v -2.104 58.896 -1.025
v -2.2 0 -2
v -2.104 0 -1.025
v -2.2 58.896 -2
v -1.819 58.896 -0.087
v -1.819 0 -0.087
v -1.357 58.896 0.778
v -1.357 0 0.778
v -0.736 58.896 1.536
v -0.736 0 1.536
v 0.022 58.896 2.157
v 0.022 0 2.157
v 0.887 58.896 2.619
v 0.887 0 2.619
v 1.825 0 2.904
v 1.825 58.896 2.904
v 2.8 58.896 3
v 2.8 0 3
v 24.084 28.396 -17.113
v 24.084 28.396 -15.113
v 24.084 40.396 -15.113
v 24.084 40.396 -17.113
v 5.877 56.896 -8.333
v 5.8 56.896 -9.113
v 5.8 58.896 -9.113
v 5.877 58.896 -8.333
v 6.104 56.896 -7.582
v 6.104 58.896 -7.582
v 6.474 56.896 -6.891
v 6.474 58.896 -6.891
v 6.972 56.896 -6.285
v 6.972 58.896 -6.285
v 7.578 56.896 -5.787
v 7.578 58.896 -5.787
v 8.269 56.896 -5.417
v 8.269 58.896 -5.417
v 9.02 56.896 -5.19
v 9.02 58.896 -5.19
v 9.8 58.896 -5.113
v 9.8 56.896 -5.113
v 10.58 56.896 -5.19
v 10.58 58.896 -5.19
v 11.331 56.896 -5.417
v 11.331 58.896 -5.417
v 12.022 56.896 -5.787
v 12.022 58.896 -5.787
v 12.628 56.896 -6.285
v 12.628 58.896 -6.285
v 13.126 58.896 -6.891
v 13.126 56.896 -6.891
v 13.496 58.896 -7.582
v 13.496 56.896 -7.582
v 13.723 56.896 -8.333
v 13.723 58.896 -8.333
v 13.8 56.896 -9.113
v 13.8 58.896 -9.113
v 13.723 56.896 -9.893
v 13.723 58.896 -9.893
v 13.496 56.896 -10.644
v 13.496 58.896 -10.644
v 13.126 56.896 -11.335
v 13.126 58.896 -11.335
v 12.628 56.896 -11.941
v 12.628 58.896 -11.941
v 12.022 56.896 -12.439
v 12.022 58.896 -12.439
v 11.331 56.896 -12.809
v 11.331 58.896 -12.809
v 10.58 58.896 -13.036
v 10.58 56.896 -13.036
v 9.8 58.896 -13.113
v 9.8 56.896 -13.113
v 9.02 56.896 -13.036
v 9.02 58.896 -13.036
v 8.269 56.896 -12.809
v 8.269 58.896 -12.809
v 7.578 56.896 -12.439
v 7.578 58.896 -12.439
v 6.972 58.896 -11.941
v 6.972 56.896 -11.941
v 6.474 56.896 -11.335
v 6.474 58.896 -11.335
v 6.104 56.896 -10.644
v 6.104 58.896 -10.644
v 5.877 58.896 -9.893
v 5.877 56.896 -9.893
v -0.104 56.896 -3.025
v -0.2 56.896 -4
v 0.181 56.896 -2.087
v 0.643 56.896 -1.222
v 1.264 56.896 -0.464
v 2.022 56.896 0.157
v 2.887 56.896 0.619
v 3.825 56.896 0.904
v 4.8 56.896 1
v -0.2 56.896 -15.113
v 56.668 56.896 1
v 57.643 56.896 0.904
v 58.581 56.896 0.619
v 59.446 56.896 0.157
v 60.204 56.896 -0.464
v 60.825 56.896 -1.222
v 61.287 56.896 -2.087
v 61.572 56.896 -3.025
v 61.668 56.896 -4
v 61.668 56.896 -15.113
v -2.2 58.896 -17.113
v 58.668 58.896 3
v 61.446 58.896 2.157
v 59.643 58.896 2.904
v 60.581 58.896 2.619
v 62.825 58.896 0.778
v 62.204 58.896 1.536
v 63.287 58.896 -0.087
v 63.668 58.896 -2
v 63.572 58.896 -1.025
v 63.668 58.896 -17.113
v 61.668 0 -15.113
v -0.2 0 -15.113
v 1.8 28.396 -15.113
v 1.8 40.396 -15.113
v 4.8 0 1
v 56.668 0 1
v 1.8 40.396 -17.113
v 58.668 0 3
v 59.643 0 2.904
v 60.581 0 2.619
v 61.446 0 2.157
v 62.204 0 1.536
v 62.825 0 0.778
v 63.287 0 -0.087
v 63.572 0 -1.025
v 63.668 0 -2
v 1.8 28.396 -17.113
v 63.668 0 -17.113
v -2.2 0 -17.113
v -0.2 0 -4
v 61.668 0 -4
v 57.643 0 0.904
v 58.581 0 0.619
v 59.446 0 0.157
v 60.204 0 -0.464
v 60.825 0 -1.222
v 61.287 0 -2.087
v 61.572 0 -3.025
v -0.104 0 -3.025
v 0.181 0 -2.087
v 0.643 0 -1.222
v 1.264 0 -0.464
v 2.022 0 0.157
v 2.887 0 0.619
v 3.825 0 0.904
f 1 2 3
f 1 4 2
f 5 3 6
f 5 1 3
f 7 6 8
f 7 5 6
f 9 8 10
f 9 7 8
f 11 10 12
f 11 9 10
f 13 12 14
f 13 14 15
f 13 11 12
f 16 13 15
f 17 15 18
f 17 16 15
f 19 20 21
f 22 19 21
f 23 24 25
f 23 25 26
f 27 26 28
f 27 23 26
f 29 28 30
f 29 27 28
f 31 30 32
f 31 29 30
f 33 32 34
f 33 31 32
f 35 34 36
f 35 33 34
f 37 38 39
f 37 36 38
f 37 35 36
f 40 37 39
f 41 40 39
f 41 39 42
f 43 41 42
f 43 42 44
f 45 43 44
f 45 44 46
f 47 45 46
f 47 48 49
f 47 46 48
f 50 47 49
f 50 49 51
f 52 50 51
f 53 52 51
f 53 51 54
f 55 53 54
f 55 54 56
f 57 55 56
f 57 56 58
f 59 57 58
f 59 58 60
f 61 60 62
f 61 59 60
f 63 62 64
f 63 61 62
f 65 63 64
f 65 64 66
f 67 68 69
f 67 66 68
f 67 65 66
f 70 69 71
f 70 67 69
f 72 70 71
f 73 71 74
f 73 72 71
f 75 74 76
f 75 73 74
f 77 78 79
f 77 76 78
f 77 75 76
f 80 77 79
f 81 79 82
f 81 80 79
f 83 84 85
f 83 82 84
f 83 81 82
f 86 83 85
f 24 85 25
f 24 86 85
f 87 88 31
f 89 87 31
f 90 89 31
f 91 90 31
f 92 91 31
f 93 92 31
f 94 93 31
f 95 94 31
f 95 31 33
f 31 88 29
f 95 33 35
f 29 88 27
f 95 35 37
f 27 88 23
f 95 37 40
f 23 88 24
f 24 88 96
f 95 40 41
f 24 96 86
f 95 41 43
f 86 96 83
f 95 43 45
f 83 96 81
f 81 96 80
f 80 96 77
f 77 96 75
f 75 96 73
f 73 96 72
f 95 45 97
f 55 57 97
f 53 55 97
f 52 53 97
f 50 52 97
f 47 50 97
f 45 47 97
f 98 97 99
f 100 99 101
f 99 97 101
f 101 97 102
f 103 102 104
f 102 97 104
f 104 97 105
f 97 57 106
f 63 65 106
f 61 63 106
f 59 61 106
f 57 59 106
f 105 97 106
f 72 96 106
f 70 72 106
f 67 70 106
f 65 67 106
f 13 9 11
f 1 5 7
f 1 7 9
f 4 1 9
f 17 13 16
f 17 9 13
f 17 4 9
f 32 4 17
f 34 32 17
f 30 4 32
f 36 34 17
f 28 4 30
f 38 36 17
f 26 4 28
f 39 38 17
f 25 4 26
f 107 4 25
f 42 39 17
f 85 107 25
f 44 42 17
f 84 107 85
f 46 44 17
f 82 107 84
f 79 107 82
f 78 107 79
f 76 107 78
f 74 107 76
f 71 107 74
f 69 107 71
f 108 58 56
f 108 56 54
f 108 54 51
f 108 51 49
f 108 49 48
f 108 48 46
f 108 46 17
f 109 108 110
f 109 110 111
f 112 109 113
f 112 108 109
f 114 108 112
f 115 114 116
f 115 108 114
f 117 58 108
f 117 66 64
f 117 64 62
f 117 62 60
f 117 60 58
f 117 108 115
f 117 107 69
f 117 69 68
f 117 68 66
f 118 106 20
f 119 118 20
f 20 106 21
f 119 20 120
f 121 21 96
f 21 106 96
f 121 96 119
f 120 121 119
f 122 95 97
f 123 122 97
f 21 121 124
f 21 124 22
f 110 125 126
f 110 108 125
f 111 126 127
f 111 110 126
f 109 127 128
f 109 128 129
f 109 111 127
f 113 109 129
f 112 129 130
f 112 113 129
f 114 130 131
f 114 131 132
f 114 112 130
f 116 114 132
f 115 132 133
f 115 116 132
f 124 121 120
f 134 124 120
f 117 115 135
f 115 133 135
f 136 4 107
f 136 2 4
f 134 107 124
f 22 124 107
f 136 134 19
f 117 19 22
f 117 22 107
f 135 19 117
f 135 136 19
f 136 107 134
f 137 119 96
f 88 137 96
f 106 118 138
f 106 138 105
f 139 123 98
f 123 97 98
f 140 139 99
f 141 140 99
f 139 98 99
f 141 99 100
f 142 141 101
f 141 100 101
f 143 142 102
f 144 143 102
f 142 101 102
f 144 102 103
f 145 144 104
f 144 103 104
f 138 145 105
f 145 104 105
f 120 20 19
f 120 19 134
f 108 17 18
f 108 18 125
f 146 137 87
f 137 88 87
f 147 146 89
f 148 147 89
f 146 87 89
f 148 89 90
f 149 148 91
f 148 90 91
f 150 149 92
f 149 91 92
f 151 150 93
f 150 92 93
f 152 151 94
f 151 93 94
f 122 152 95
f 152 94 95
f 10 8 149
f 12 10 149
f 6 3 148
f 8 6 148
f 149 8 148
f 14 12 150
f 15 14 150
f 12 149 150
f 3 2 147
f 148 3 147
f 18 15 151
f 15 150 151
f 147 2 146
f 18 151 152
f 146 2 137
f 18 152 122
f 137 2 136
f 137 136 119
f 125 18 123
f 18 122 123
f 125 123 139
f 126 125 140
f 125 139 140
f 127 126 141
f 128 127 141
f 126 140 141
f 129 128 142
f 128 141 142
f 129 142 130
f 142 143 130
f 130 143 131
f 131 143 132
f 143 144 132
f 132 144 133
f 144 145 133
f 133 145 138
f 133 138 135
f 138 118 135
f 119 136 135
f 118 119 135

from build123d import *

# Parameters (mm, degrees)
SKETCH_1_W               = 65.868
SKETCH_1_H               = 56.896
EXTRUDE_1_DEPTH          = 2
CUT_EXTRUDE_1_DEPTH      = 86.409420089
CUT_EXTRUDE_1_DEPTH_BACK = 86.409420089
SKETCH_3_W               = 2
SKETCH_3_H               = 56.896
EXTRUDE_2_DEPTH          = 18.113
SKETCH_4_W               = 65.868
SKETCH_4_H               = 56.896
EXTRUDE_3_DEPTH          = 2
SKETCH_5_W               = 65.868
SKETCH_5_H               = 20.113
EXTRUDE_4_DEPTH          = 2
FILLET_1_R               = 5
CUT_EXTRUDE_2_DEPTH      = 89.403664002
CUT_EXTRUDE_2_DEPTH_BACK = 89.403664002
SKETCH_6_R               = 4


with BuildPart() as part:
    # Эскиз1 → Бобышка-Вытянуть1 (new body)
    with BuildSketch(Plane(origin=(0, 0, -15.113), x_dir=(-1, 0, 0), z_dir=(0, 0, -1))):
        with Locations((-30.734, 28.448)):
            Rectangle(SKETCH_1_W, SKETCH_1_H)
    extrude(amount=EXTRUDE_1_DEPTH)

    # Эскиз2 → Вырез-Вытянуть1 (cut, two sides: drawn at the far end of the back side and taken through both)
    with BuildSketch(Plane(origin=(0, 0, -17.113), x_dir=(-1, 0, 0), z_dir=(0, 0, -1)).offset(-CUT_EXTRUDE_1_DEPTH_BACK)):
        Polygon((-20.084, 40.396), (-1.8, 40.396), (-1.8, 28.396), (-20.084, 28.396), (-24.084, 28.396), (-24.084, 40.396), align=None)
    extrude(amount=CUT_EXTRUDE_1_DEPTH + CUT_EXTRUDE_1_DEPTH_BACK, mode=Mode.SUBTRACT)

    # Эскиз3 → Бобышка-Вытянуть2 (add)
    with BuildSketch(Plane.XY.offset(-15.113)):
        with Locations((-1.2, 28.448)):
            Rectangle(SKETCH_3_W, SKETCH_3_H)
        with Locations((62.668, 28.448)):
            Rectangle(SKETCH_3_W, SKETCH_3_H)
    extrude(amount=EXTRUDE_2_DEPTH)

    # Эскиз4 → Бобышка-Вытянуть3 (add)
    with BuildSketch(Plane.XY.offset(3)):
        with Locations((30.734, 28.448)):
            Rectangle(SKETCH_4_W, SKETCH_4_H)
    extrude(amount=-EXTRUDE_3_DEPTH)

    # Эскиз5 → Бобышка-Вытянуть4 (add)
    with BuildSketch(Plane(origin=(0, 56.896, 0), x_dir=(1, 0, 0), z_dir=(0, 1, 0))):
        with Locations((30.734, 7.0565)):
            Rectangle(SKETCH_5_W, SKETCH_5_H)
    extrude(amount=EXTRUDE_4_DEPTH)

    # Скругление1
    fillet_1_edges = [part.edges().sort_by_distance(p)[0] for p in [
        (-2.2, 29.448, 3),
        (63.668, 29.448, 3),
        (61.668, 28.448, 1),
        (-0.2, 28.448, 1),
    ]]
    fillet(fillet_1_edges, radius=FILLET_1_R)

    # Эскиз6 → Вырез-Вытянуть2 (cut, two sides: drawn at the far end of the back side and taken through both)
    with BuildSketch(Plane(origin=(0, 58.896, 0), x_dir=(1, 0, 0), z_dir=(0, 1, 0)).offset(-CUT_EXTRUDE_2_DEPTH_BACK)):
        with Locations(Location((9.8, 9.113, 0), (0, 0, 180))):
            Circle(SKETCH_6_R)
    extrude(amount=CUT_EXTRUDE_2_DEPTH + CUT_EXTRUDE_2_DEPTH_BACK, mode=Mode.SUBTRACT)


solid = part.part
